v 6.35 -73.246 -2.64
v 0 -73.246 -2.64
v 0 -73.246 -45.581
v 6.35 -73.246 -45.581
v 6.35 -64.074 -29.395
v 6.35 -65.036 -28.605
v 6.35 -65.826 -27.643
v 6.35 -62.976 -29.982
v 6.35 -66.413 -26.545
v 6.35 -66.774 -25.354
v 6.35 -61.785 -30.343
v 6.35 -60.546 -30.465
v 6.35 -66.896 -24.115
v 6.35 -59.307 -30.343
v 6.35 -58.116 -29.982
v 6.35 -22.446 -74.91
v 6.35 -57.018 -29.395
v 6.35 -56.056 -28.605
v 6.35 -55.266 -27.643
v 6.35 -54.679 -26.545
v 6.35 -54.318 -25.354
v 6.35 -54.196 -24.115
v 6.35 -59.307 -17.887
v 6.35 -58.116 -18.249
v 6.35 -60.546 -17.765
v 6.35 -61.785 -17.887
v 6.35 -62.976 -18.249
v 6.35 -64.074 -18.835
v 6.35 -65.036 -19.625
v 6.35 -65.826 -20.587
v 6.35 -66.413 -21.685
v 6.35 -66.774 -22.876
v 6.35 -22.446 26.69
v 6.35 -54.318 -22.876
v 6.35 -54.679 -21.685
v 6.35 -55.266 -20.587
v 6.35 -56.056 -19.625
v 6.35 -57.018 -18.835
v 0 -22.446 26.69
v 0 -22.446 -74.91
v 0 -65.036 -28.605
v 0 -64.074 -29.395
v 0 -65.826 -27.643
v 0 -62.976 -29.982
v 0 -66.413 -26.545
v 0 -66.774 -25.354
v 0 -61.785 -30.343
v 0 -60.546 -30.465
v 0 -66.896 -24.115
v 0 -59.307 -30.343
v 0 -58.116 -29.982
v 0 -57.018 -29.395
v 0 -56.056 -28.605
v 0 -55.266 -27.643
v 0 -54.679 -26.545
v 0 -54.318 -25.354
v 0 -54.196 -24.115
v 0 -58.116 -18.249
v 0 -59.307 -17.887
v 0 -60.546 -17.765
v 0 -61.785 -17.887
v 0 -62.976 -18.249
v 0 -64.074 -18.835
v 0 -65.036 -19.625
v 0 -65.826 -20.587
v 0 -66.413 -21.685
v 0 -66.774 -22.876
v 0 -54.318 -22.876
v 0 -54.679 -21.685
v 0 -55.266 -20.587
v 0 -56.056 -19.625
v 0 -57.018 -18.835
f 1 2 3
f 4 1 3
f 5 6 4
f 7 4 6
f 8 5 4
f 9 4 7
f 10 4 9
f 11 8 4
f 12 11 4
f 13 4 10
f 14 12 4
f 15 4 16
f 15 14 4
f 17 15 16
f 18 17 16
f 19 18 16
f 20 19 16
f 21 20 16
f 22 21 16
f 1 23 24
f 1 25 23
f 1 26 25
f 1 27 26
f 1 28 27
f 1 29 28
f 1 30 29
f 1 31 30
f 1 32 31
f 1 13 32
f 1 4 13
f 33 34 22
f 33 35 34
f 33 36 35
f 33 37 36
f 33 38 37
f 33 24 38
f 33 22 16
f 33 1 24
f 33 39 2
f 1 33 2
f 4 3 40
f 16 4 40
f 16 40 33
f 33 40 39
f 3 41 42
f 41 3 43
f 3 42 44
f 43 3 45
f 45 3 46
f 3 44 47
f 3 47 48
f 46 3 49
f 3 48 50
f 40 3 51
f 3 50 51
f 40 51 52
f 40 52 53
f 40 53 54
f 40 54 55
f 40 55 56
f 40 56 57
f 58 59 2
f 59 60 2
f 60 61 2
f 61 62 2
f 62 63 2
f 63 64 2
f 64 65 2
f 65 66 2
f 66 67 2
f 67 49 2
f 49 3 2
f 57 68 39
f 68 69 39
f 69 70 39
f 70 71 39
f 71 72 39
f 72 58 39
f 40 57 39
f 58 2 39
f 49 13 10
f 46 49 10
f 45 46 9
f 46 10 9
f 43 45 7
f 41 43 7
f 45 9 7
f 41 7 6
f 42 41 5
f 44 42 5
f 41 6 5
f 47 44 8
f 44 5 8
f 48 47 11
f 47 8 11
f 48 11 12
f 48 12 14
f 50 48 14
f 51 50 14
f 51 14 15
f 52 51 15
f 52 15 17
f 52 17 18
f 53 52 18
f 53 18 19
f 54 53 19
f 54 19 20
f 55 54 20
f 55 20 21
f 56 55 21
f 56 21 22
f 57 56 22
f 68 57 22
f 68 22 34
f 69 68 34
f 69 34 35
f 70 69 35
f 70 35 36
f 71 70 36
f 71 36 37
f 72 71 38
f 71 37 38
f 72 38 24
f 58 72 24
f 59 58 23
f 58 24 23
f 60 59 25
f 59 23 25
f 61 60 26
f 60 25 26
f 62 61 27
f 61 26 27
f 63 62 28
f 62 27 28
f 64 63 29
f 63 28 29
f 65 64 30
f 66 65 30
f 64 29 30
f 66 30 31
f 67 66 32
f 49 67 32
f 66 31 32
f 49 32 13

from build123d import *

# Parameters (mm, degrees)
F1_DEPTH = 6.35
F2_D     = 12.7


# Not quite as in the source:
# - a feature names something its author has since deleted; it is built from what else it names


with BuildPart() as f1:
    # F0 (on Right) → F1 (new body)
    with BuildSketch(Plane.YZ):
        Polygon((-73.2459126534, -2.6395988316), (-73.2459126534, -45.580811482), (-22.4459126534, -74.9102051568), (-22.4459126534, 26.6897948432), align=None)
    extrude(amount=F1_DEPTH)

    # F2 (through all)
    with Locations(Plane(origin=(0, 0, 0), x_dir=(0, 1, 0), z_dir=(-1, 0, 0))):
        with Locations((-60.5459126534, 24.1152988316)):
            Hole(F2_D / 2)


solid = f1.part
